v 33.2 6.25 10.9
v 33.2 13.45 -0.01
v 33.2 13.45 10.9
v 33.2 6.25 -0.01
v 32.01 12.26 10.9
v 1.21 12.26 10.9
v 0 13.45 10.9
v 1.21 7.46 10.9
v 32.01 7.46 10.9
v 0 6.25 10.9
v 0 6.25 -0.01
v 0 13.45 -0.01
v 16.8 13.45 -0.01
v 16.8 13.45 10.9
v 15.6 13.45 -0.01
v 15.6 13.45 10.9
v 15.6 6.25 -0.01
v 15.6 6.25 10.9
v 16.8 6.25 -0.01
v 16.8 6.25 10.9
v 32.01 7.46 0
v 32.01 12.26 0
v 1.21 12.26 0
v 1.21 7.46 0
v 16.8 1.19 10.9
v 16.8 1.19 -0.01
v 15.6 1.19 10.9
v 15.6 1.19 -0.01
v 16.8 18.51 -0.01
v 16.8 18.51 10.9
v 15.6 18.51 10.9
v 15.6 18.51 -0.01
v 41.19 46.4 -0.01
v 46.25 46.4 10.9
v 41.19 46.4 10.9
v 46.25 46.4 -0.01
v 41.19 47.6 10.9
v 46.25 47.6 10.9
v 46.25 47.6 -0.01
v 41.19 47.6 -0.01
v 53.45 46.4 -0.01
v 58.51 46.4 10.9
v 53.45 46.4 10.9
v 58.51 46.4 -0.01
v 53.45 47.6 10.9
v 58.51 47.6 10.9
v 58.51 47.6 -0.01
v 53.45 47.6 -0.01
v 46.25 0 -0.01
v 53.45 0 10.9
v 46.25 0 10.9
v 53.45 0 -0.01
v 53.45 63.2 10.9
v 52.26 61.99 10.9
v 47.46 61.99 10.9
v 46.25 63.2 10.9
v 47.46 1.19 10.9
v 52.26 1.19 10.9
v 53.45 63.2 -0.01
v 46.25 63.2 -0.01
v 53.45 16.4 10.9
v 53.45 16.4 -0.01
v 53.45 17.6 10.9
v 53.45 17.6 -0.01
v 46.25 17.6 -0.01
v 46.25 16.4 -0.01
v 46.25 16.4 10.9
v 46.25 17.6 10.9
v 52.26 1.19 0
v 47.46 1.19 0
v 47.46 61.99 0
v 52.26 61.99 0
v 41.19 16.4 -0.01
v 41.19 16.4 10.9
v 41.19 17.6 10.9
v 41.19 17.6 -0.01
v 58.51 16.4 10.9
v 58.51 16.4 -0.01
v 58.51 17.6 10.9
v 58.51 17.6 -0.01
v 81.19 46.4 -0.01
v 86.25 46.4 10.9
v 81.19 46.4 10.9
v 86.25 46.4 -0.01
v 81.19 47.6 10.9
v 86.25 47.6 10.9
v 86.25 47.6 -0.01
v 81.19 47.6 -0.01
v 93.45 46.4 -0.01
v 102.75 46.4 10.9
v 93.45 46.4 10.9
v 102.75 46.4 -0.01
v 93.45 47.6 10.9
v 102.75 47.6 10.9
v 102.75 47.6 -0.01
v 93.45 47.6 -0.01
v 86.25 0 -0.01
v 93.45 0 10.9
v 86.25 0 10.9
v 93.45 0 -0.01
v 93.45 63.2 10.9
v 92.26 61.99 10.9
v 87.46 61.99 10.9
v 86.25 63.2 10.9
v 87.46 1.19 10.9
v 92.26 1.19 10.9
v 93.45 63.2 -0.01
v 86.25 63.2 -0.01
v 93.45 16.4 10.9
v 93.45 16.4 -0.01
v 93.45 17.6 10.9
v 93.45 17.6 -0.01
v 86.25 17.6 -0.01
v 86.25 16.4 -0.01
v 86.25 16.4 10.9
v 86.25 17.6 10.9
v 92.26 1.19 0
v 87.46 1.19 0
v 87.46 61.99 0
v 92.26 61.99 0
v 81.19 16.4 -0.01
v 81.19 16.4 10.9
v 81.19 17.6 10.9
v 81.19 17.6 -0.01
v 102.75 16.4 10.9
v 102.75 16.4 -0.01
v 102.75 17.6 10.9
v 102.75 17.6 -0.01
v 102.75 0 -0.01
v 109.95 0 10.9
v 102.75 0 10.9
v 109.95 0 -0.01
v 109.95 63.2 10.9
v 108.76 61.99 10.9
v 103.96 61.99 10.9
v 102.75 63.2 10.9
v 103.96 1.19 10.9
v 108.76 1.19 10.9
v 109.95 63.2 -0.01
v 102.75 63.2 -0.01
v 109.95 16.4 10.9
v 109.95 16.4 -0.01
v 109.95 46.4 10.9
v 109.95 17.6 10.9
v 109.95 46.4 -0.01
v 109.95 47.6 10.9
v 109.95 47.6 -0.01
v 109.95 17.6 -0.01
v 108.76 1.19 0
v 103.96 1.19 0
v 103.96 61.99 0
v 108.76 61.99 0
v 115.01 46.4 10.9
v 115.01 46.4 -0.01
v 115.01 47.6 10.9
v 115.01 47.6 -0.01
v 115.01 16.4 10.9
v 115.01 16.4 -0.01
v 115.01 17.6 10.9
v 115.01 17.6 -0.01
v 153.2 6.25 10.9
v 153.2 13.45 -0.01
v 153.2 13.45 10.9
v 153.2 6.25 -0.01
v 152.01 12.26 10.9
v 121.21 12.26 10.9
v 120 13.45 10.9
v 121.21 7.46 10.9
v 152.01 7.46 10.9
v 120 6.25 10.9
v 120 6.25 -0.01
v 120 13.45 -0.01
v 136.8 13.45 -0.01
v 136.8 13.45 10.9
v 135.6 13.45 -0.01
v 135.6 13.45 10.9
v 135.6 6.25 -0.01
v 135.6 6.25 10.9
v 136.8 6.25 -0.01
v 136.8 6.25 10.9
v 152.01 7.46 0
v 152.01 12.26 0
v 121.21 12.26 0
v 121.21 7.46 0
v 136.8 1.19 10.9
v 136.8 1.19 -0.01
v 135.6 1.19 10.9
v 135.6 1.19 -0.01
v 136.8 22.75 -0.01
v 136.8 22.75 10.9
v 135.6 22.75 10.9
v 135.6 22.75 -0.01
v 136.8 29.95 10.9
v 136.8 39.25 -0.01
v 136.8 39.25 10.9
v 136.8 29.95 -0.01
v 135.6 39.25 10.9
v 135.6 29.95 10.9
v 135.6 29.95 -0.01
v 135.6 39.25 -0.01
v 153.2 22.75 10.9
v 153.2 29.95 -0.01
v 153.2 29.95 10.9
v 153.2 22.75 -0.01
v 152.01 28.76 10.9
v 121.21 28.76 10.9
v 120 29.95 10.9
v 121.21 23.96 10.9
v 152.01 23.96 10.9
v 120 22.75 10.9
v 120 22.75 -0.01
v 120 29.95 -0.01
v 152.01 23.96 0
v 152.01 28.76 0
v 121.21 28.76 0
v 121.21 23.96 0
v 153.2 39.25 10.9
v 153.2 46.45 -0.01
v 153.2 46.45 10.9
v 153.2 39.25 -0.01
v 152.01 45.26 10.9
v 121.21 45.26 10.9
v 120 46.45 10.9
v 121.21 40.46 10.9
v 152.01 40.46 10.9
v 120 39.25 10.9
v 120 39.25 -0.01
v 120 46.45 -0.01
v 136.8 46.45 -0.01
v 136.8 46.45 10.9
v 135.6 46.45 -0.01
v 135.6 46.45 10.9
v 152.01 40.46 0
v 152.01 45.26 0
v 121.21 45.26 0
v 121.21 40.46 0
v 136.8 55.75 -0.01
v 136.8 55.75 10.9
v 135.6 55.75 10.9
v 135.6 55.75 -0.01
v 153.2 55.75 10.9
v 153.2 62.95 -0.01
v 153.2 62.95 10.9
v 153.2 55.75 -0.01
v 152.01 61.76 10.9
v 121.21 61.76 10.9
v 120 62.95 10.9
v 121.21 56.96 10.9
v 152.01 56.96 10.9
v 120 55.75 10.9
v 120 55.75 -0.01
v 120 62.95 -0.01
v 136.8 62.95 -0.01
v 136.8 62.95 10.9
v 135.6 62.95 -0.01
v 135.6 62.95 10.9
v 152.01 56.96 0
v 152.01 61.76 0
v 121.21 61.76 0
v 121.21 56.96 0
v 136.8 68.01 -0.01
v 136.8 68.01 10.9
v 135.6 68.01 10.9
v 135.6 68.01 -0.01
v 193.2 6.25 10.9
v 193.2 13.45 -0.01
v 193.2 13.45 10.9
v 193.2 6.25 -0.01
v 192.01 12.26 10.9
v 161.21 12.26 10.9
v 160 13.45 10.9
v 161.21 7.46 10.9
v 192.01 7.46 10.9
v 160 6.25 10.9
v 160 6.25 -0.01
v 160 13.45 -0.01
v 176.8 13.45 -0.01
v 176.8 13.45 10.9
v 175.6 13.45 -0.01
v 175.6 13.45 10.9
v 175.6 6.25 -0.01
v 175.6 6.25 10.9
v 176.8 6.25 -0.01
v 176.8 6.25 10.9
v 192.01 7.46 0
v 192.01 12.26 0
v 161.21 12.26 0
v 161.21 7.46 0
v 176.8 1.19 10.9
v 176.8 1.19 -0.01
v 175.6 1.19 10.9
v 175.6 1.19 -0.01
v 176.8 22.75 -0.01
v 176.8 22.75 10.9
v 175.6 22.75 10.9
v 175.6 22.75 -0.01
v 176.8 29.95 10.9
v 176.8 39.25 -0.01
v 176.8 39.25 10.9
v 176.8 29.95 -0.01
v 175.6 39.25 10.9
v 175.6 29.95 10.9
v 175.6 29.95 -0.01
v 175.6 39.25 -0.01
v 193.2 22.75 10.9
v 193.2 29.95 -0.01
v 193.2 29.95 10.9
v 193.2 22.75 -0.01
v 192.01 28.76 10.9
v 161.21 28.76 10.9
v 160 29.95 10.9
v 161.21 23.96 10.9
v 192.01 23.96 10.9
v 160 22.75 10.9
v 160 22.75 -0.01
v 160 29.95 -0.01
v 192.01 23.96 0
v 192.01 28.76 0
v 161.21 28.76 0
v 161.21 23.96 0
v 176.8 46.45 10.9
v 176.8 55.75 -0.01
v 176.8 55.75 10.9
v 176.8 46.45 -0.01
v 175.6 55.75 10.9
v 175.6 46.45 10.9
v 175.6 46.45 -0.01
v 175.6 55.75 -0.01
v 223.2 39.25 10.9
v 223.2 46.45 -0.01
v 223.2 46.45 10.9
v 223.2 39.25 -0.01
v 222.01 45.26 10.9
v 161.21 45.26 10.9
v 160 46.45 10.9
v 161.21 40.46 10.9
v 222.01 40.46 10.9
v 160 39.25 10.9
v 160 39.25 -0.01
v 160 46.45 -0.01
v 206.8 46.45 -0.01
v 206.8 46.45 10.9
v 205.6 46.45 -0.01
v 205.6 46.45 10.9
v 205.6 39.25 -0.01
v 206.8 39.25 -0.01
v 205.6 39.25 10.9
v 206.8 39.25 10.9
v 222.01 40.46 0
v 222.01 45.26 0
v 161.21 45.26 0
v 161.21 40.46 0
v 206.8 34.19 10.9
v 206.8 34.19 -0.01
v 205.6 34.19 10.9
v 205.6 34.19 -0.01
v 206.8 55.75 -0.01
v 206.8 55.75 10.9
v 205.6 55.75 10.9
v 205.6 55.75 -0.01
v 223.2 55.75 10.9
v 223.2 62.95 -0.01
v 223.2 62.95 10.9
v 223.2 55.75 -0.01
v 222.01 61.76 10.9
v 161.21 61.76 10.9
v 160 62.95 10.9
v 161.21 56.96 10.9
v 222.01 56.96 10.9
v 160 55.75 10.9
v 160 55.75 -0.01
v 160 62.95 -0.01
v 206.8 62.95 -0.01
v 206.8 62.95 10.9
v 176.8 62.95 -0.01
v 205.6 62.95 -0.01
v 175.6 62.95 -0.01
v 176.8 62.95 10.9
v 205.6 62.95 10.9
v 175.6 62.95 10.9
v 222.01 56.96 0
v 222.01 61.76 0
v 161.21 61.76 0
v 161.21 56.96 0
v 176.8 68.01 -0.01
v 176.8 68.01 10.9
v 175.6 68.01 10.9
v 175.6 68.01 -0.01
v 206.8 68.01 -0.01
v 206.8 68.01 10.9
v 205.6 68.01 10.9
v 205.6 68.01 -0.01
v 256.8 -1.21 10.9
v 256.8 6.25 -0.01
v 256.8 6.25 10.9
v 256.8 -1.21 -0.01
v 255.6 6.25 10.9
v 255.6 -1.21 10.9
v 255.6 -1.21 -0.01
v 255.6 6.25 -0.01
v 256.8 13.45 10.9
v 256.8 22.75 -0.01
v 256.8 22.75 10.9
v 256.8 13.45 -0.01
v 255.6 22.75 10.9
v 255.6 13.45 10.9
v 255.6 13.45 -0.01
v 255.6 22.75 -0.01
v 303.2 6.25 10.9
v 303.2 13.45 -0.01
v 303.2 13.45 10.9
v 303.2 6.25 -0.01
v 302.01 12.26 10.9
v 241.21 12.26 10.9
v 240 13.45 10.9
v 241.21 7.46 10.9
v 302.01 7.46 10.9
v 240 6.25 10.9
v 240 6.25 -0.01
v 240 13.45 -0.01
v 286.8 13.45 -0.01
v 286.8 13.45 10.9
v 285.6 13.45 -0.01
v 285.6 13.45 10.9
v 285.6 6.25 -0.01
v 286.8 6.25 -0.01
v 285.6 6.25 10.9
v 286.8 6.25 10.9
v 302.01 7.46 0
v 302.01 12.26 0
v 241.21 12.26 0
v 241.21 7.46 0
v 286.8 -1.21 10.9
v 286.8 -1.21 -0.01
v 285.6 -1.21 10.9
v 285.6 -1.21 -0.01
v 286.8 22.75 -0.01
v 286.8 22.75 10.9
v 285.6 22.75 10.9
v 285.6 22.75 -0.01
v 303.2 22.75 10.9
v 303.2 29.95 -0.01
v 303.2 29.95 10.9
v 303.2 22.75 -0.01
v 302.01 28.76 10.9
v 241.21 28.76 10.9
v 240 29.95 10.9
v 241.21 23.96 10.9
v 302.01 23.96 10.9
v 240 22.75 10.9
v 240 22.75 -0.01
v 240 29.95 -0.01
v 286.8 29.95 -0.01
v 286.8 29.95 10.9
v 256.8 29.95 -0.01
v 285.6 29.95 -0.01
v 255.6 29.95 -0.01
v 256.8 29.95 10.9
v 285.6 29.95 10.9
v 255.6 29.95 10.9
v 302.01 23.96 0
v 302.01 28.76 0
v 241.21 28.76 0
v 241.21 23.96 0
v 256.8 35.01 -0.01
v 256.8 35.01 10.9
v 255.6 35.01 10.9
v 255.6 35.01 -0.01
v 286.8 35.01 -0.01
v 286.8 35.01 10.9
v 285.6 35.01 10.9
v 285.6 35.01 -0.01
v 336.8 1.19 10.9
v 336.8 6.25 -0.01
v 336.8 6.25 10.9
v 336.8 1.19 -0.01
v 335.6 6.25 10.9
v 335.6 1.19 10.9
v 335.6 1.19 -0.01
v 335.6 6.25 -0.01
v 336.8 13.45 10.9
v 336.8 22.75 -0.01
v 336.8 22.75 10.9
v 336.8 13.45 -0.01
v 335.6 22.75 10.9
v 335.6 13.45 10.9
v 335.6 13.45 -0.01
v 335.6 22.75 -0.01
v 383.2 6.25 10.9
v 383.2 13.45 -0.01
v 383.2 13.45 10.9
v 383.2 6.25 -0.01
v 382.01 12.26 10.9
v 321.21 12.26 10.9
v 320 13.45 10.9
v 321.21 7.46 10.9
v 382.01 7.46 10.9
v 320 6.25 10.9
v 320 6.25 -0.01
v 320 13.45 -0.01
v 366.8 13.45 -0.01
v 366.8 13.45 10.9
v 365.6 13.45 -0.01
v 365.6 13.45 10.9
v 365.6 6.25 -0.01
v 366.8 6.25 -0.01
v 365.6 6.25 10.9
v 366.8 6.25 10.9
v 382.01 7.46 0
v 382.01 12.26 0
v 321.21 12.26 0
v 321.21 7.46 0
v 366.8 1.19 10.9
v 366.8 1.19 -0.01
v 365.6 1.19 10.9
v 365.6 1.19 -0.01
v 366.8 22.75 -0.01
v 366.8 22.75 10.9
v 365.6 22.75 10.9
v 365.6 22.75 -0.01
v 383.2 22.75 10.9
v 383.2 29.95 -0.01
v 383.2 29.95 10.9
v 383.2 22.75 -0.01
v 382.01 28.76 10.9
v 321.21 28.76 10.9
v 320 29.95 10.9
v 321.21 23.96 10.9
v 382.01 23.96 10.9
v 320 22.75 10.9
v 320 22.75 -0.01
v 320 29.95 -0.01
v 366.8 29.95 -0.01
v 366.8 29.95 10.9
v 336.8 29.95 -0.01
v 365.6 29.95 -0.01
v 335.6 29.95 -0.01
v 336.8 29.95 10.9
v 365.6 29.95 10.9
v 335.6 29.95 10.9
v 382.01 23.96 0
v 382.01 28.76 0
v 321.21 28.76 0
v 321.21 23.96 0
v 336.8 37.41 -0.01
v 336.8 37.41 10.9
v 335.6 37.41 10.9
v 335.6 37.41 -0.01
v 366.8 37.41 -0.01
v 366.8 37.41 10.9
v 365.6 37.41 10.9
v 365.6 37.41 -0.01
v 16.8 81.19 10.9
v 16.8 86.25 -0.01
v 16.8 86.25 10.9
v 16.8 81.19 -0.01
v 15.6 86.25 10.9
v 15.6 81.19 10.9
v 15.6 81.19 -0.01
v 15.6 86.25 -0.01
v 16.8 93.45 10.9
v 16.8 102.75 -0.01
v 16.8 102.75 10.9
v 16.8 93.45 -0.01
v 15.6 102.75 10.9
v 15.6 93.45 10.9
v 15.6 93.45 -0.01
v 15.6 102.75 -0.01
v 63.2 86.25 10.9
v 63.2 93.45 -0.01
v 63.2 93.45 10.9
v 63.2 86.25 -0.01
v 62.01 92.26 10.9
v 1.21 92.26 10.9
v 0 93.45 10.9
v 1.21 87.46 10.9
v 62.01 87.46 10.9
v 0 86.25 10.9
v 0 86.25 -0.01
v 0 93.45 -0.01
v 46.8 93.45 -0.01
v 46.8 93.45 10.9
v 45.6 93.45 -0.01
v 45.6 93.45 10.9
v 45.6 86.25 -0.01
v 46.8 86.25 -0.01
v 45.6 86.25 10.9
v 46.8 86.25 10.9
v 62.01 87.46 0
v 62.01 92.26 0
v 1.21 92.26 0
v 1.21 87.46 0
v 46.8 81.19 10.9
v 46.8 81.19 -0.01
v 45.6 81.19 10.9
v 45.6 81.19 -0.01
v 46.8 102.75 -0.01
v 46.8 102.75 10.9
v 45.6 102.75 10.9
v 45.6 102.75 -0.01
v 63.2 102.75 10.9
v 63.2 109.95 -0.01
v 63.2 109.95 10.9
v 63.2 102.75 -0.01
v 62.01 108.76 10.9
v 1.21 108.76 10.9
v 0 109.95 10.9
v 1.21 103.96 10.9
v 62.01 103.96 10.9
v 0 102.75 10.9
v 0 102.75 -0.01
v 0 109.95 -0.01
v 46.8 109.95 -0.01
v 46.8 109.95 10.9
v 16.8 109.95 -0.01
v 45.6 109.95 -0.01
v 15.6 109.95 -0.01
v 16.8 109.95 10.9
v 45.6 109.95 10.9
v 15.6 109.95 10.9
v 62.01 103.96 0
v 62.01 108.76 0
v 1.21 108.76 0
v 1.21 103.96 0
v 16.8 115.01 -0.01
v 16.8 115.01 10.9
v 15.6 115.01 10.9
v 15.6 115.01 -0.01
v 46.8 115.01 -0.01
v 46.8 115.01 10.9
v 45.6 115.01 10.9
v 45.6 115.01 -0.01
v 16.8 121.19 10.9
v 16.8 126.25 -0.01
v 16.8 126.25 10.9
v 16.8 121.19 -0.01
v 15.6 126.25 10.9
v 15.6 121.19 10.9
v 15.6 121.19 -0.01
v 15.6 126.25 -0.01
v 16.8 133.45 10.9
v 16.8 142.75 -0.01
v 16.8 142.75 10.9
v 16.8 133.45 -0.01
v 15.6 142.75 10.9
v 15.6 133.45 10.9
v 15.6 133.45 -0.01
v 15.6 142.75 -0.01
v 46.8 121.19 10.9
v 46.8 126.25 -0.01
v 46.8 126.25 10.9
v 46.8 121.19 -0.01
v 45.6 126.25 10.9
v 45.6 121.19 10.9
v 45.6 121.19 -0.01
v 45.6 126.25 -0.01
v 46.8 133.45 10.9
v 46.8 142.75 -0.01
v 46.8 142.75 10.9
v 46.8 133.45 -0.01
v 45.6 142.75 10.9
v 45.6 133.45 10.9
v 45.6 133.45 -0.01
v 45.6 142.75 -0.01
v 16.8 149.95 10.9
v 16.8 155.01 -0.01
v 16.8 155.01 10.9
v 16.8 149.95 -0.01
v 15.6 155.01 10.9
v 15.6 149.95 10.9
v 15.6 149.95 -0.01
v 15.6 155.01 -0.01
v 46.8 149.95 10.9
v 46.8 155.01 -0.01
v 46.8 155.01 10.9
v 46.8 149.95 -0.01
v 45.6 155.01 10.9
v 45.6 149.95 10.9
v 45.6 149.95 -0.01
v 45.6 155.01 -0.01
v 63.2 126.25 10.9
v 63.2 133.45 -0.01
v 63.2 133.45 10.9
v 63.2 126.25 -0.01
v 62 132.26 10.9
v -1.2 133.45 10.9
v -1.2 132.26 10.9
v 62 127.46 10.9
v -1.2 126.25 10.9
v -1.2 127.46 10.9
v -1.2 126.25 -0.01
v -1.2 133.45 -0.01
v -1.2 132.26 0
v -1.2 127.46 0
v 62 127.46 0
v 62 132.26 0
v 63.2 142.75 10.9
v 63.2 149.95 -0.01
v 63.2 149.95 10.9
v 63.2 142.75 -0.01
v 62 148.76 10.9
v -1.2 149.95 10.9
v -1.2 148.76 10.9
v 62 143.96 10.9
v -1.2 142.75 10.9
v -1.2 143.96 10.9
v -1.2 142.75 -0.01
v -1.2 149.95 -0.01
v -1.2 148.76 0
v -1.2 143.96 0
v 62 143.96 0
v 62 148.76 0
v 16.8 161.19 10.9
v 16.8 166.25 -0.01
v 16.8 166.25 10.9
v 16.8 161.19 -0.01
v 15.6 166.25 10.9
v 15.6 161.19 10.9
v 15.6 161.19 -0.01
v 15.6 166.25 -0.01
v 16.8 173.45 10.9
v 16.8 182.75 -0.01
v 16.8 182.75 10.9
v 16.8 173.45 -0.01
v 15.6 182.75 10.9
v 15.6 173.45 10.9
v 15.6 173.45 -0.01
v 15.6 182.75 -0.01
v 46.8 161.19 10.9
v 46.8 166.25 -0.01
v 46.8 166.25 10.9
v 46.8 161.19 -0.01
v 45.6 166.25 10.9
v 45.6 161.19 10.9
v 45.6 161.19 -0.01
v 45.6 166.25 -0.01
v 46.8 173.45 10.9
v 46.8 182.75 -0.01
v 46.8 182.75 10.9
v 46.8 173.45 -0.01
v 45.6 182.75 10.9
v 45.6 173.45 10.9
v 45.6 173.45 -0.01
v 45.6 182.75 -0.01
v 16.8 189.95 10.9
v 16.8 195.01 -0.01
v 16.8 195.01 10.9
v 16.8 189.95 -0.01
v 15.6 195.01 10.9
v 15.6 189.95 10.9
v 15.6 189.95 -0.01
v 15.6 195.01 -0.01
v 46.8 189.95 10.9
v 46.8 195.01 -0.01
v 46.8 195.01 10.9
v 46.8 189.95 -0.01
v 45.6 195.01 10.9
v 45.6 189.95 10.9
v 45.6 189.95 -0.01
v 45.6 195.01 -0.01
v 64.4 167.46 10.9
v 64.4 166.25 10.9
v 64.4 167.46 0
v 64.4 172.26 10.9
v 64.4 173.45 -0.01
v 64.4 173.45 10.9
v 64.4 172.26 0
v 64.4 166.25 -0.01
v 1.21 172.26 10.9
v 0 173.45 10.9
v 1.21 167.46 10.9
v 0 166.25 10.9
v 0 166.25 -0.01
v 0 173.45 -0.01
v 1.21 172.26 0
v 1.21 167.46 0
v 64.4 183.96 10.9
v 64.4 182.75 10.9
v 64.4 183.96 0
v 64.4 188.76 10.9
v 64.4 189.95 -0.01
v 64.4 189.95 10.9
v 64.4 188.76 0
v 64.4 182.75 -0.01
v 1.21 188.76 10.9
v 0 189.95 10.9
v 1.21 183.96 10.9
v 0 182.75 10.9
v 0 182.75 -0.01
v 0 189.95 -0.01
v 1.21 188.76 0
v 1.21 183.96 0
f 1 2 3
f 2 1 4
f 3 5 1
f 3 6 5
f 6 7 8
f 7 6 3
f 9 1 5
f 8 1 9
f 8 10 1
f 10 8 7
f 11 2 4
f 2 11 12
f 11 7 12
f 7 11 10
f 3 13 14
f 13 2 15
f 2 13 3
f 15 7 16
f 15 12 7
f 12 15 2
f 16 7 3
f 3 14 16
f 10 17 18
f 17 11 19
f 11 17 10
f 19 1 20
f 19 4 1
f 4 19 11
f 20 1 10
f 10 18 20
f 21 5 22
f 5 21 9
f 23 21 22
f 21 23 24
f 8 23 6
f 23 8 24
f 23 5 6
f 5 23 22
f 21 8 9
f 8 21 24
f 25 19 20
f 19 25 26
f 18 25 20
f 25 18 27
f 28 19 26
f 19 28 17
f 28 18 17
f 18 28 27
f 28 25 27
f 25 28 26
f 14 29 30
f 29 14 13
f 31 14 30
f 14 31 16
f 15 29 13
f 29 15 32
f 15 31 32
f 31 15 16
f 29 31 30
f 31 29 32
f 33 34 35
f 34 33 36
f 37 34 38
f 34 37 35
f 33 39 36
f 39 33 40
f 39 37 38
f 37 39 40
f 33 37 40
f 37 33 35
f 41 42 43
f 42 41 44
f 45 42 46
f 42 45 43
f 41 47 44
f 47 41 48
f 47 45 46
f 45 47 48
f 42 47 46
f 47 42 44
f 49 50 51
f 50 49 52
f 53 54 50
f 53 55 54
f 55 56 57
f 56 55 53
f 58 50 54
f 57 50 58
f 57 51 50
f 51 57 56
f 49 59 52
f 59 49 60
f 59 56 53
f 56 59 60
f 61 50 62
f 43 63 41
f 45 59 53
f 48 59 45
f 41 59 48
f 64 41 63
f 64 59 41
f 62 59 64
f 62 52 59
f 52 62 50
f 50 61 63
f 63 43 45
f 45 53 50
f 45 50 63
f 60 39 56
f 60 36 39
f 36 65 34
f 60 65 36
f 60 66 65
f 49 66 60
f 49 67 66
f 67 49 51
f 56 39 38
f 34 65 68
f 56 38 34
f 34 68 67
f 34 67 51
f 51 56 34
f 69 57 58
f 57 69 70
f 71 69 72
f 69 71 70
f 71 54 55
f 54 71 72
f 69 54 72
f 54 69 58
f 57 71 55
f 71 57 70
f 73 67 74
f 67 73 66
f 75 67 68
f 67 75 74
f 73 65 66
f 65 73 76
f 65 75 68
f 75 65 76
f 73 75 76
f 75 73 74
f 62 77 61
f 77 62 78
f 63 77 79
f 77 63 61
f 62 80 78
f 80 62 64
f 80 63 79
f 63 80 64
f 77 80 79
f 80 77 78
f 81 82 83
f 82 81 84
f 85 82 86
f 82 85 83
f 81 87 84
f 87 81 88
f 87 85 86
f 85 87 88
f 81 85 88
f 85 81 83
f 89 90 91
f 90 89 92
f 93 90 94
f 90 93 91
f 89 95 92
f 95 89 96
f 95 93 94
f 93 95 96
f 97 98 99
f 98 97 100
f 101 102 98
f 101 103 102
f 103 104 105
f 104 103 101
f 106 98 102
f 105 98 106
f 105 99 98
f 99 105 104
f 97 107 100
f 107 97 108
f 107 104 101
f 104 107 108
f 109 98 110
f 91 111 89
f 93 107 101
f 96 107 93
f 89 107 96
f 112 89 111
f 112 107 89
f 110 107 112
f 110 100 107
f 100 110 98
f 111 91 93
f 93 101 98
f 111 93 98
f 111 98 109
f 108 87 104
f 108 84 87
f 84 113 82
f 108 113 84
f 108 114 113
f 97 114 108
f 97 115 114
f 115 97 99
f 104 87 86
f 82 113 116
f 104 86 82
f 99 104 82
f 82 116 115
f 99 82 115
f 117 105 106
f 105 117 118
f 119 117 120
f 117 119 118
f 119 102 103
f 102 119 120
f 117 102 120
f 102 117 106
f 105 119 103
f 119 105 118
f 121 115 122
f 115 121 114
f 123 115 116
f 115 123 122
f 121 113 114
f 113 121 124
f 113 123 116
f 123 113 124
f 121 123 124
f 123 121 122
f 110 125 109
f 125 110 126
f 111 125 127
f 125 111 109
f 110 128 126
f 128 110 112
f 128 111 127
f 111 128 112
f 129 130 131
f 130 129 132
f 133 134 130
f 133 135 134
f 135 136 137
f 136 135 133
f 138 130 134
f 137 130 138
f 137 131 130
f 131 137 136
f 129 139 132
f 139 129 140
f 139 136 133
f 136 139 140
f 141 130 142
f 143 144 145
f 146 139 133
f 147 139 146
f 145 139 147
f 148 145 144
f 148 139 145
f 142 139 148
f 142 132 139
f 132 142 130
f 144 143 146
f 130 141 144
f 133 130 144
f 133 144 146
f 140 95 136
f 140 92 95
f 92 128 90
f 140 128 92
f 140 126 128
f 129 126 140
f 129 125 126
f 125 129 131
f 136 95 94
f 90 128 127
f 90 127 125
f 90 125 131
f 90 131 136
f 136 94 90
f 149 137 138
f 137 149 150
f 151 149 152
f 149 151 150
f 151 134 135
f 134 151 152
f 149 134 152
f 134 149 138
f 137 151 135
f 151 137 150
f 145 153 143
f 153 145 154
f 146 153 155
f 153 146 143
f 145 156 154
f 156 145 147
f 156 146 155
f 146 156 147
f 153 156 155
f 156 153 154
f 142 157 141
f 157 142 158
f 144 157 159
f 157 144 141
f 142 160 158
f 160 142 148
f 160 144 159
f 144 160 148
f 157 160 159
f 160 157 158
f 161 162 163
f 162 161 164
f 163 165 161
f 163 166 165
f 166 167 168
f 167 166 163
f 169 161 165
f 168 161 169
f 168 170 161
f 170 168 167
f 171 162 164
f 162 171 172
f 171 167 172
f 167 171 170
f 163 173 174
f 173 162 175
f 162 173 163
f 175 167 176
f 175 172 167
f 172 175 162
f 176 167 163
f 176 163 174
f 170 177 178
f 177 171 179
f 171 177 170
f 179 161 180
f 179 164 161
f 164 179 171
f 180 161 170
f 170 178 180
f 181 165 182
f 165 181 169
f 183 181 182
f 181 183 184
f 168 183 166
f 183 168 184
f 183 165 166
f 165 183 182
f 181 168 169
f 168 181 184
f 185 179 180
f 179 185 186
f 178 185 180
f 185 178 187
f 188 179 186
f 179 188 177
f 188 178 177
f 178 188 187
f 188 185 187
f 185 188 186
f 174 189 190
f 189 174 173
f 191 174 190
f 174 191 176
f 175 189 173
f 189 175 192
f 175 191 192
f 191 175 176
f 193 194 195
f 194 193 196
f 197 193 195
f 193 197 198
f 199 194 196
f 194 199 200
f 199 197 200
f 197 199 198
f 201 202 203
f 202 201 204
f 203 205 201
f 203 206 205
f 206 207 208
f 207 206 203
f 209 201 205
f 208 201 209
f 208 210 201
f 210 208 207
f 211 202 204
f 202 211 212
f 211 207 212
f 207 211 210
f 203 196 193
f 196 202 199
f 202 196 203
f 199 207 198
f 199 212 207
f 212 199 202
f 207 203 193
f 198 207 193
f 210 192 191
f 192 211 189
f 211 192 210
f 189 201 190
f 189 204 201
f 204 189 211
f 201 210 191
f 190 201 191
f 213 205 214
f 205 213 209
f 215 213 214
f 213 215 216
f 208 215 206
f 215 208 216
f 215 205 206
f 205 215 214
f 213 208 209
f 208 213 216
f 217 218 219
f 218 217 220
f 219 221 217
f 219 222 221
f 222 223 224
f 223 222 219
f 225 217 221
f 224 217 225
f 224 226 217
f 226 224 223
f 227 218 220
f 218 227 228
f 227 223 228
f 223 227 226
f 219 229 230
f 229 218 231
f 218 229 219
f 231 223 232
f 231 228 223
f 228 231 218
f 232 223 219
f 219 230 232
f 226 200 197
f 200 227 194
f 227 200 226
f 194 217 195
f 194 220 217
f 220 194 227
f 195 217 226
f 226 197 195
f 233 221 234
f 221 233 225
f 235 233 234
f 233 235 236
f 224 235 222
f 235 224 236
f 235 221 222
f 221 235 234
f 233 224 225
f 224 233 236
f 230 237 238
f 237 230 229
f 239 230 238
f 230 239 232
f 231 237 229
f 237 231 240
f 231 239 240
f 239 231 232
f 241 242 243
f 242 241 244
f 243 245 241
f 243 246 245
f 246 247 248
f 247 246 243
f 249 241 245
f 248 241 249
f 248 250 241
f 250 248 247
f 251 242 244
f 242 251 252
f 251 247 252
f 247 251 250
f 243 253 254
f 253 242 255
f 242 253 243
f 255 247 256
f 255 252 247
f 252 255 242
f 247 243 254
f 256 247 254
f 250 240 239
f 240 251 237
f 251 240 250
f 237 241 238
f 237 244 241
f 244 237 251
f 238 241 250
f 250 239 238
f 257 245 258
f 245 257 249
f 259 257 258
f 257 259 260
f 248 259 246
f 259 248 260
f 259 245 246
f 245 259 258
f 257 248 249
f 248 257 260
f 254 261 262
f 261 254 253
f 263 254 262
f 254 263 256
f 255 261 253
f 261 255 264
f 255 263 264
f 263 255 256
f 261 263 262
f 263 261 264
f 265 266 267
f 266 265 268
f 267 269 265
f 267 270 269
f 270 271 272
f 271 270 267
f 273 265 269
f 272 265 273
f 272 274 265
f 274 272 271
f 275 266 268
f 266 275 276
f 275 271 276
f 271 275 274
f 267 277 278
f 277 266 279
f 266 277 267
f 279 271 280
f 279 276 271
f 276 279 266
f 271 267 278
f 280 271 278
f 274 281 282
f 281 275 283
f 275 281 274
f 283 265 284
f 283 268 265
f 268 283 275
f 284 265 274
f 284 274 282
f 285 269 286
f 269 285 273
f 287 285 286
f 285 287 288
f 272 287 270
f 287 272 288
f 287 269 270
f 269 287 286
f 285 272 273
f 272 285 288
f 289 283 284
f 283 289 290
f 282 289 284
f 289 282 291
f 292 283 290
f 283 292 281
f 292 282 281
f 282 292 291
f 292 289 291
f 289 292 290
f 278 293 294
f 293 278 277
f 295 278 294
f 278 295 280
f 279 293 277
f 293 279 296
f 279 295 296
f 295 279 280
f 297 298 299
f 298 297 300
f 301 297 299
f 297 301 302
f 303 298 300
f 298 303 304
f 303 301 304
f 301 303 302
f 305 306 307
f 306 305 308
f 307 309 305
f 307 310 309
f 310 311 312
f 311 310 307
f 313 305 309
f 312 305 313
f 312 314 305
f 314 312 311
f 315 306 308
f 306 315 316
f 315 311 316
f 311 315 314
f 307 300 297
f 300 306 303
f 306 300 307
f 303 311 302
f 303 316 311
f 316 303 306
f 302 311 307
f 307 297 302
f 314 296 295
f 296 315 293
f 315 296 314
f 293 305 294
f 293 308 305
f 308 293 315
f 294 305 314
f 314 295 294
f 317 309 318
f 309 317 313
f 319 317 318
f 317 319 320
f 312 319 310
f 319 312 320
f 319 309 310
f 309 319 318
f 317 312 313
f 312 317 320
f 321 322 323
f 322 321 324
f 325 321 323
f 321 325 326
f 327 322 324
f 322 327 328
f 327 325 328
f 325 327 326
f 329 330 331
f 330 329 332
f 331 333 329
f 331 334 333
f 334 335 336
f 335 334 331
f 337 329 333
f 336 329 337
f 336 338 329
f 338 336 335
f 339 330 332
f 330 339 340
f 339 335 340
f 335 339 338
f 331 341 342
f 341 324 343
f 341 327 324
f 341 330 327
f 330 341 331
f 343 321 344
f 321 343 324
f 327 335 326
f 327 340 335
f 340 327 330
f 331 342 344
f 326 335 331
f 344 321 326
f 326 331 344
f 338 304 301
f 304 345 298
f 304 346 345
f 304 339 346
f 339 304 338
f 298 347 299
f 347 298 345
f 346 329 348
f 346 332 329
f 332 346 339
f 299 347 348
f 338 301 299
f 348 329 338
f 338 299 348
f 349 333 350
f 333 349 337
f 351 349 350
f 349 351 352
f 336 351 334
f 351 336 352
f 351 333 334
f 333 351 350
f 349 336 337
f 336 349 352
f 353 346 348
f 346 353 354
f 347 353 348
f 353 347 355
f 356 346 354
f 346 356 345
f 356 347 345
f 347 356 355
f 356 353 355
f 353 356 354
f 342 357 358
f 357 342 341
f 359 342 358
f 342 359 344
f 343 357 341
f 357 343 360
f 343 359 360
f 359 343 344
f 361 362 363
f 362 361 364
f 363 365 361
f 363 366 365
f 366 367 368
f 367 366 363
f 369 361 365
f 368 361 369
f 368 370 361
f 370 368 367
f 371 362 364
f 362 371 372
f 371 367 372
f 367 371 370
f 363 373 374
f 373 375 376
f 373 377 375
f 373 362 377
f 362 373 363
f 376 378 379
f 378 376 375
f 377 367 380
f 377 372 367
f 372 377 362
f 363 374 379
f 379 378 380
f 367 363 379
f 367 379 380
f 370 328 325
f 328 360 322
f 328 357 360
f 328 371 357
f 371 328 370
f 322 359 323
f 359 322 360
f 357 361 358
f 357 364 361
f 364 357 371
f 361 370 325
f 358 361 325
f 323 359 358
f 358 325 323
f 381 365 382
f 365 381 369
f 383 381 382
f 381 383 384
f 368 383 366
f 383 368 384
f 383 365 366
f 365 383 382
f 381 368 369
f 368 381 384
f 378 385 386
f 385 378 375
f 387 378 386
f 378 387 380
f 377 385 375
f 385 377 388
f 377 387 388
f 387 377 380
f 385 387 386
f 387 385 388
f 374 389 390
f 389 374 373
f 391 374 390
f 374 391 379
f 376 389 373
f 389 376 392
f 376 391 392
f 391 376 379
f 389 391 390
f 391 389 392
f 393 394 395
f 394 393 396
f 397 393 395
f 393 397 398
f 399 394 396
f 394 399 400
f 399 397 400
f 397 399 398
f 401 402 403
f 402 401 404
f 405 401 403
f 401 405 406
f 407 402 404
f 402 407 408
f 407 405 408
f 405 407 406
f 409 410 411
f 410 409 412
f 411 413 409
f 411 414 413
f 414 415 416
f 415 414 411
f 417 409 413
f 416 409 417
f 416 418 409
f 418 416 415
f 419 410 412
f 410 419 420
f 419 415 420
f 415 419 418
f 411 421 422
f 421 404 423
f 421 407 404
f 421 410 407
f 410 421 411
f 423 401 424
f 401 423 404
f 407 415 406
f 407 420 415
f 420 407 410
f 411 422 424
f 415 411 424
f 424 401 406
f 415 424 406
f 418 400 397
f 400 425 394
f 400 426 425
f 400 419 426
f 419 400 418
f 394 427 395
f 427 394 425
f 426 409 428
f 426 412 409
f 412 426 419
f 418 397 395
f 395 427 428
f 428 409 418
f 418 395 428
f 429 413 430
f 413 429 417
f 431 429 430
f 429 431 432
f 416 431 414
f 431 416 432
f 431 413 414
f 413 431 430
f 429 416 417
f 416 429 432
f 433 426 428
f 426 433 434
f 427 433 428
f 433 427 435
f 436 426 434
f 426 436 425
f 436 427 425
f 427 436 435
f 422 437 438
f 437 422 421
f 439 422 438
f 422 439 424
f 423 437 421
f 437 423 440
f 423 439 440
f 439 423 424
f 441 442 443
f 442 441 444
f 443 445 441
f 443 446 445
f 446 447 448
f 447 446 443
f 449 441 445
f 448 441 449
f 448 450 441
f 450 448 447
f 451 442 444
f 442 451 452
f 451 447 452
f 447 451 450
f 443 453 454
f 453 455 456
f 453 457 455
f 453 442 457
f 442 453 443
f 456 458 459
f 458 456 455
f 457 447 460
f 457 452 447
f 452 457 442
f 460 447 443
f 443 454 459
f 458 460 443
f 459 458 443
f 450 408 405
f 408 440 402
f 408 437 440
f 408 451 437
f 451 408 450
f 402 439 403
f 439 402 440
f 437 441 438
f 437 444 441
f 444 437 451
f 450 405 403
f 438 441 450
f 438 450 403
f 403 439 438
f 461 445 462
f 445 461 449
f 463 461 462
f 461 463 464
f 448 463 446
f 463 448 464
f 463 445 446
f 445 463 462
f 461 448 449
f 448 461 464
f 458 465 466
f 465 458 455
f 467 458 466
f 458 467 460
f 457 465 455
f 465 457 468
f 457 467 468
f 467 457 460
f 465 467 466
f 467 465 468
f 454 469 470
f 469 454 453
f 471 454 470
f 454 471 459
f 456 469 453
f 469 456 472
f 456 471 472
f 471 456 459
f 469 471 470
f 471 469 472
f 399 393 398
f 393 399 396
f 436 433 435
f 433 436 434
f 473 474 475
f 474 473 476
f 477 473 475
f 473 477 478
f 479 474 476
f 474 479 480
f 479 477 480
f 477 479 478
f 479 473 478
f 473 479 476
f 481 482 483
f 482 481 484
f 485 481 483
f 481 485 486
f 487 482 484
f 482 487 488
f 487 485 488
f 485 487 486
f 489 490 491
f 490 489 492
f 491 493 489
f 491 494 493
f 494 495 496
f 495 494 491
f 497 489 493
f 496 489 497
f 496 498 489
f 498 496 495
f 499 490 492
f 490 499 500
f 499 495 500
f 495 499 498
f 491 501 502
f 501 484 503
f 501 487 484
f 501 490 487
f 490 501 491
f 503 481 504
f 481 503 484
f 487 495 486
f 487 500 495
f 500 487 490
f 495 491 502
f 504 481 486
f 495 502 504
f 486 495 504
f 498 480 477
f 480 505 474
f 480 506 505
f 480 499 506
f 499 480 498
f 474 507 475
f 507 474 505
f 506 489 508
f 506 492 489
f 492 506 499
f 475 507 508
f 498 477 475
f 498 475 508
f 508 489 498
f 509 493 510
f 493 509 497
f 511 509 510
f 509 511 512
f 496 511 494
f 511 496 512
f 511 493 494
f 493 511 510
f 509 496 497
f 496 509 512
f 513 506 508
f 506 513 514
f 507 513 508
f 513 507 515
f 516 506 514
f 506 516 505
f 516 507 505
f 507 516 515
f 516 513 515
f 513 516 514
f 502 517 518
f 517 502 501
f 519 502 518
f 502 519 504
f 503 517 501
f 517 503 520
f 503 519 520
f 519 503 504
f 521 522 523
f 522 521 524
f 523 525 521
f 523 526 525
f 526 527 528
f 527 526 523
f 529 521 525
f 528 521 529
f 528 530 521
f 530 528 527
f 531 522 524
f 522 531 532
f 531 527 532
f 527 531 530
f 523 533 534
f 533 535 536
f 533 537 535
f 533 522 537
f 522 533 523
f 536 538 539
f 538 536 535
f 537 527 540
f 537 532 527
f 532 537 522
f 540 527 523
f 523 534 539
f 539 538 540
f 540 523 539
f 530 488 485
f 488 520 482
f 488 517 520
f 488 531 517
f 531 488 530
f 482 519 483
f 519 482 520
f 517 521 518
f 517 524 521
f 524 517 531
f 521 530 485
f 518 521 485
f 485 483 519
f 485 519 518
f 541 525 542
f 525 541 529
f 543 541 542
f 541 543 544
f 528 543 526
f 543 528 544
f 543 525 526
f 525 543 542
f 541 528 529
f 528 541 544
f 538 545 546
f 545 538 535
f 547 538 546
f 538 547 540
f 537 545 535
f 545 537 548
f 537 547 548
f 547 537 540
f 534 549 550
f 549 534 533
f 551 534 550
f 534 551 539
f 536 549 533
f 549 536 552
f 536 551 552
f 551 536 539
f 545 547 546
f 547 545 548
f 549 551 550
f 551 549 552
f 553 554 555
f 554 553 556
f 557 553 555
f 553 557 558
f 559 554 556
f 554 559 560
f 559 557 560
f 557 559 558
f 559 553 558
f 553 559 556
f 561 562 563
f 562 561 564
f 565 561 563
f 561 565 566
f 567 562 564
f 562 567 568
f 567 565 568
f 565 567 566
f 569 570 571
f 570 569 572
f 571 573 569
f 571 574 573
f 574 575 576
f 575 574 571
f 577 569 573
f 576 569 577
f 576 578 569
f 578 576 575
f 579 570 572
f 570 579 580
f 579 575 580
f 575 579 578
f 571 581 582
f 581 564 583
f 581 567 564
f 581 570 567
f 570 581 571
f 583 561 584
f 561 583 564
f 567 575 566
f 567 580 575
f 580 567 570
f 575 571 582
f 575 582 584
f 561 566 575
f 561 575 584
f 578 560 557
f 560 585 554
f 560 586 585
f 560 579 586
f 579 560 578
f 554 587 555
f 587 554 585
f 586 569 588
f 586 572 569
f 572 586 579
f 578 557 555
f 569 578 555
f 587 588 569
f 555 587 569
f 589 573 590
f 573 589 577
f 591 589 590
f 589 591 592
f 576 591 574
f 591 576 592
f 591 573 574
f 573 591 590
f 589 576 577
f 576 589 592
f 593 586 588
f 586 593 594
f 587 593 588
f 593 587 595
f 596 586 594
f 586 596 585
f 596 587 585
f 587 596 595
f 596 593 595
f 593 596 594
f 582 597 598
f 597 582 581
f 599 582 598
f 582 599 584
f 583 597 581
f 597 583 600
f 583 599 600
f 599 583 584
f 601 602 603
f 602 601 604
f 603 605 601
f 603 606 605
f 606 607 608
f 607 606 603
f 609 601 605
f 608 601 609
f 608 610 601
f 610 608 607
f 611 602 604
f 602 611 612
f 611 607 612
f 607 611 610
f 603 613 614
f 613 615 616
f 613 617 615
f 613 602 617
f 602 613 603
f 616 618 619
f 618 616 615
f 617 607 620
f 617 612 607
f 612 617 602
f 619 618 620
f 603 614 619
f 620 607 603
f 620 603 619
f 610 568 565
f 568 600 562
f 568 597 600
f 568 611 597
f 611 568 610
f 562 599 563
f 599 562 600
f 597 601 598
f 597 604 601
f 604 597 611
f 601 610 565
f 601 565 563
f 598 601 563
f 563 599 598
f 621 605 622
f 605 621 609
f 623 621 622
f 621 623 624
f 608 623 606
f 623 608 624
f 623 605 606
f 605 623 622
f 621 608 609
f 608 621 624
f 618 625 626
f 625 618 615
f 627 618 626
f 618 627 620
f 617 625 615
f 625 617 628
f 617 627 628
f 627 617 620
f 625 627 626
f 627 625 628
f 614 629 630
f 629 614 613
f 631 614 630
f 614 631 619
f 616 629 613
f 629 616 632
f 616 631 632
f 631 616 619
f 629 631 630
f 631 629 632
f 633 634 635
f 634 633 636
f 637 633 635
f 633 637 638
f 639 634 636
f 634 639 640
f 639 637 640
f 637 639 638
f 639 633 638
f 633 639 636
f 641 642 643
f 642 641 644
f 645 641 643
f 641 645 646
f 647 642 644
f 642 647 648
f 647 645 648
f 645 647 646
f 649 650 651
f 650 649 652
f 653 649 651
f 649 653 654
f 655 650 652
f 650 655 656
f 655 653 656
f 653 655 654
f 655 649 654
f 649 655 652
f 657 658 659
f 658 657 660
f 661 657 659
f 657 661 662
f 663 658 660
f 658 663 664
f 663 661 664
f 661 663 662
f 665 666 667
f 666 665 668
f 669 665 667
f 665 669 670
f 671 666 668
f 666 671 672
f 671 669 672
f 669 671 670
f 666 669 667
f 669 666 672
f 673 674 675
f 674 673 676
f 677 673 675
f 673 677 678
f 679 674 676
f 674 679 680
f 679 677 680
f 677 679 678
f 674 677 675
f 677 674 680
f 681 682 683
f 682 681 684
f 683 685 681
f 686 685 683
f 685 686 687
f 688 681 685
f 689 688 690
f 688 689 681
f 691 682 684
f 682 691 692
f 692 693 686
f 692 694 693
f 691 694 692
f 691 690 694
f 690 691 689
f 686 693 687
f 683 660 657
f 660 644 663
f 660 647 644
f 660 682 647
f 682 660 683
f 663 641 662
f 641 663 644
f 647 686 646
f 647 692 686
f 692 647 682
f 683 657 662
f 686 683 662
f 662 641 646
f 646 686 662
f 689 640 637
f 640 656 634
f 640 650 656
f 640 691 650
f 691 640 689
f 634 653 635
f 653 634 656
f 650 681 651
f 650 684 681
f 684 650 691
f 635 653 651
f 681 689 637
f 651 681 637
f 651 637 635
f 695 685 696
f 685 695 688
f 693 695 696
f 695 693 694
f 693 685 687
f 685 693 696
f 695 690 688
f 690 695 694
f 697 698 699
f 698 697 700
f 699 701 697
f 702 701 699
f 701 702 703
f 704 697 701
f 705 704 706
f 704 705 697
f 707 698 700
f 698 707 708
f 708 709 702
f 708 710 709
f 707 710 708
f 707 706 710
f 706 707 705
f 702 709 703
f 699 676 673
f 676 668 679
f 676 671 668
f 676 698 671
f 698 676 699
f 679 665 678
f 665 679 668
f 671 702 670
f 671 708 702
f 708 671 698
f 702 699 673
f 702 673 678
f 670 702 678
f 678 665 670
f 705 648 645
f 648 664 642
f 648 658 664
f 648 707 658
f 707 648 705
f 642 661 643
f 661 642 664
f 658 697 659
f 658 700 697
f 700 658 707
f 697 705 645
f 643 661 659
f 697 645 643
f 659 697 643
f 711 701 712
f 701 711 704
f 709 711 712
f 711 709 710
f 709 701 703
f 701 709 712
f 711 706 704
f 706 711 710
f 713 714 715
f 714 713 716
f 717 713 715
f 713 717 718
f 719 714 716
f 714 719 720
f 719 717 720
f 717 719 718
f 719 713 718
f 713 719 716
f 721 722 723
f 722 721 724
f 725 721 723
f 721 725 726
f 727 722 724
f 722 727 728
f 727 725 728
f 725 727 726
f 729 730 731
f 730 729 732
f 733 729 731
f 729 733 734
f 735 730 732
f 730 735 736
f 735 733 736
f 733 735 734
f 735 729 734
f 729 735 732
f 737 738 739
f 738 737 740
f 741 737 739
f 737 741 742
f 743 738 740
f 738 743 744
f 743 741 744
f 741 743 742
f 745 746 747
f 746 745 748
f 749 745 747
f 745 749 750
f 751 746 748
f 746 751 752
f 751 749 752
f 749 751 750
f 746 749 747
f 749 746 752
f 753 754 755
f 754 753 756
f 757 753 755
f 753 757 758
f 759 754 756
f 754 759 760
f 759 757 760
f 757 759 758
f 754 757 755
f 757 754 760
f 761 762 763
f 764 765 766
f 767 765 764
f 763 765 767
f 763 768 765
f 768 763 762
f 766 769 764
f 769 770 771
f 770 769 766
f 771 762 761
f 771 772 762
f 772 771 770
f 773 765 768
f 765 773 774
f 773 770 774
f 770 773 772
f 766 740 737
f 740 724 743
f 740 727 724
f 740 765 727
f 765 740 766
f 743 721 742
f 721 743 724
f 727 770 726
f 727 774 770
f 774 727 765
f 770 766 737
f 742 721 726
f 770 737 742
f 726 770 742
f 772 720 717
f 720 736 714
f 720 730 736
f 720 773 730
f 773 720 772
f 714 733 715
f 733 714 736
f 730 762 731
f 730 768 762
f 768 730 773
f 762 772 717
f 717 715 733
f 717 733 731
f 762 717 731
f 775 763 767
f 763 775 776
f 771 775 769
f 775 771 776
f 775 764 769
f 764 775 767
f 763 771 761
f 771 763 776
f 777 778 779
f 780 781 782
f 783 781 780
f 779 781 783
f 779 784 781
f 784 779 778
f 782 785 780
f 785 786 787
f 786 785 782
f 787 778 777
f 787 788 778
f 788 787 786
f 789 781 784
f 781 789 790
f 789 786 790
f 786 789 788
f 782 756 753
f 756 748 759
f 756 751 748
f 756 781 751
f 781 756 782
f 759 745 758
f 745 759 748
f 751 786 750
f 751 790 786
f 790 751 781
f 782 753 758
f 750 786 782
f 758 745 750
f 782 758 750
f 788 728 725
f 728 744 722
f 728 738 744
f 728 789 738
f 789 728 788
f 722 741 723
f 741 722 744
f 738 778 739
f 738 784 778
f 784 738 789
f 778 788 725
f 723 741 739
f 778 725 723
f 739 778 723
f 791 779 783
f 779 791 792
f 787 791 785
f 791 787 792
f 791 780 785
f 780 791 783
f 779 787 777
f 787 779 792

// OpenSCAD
// file: ../../Base/Boxes.scad
// Fischertechnik Box Foundation
// Pre-designed Boxes

use <Constants.scad>

include <PlacementOptions.scad>

box190Width = 190;
box190Depth = 130;
box130Width = 130;
box130Depth = 95;
boxUsageHeight = 33.9;
boxWallThickness = 2.4;
boxBaseThickness = 1.0;
boxWebWidth = 3.0;

// getBoxWallThickness()
// Gets the wall thickness of a Fischertechnik Box

function getBoxWallThickness() = boxWallThickness;

// Gets the usable height of a fischertechnik box
function getBoxUsageHeight() = boxUsageHeight;

// Gets the thickness of the Fischertechnik box base.
function getBoxBaseThickness() = boxBaseThickness;

// Gets the width of a box web
function getBoxWebWidth() = boxWebWidth;

// Gets the usable inner space of a Box 190 as an x/y-list
function getBox190Space() = [
    box190Width - 2*getBoxWallThickness(), 
    box190Depth - 2*getBoxWallThickness() ];

// Imports the Fischertechnik empty box 130x190 mm and places it at position 0,0
// 190x130 are the outer sizes, the inner space is slightly smaller. Use getBox190Space() to get the inner sizes.
// This module needs the STL file "Fischertechnik Box 130x190.stl" in the library path.
// The box is positioned that the usable inner space is at the 0,0,0 position. The

module Box190() {
    translate([-getBoxWallThickness(),-getBoxWallThickness(),-getBoxBaseThickness()])
        import("Fischertechnik Box 130x190.stl", convexity=3);
}

// Gets the usable inner space of a Box 130 as an x/y-list
function getBox130Space() = [
    box130Width - 2*getBoxWallThickness(), 
    box130Depth - 2*getBoxWallThickness() ];

// Imports the Fischertechnik empty box 95x130 mm and places it at position 0,0
// 190x130 are the outer sizes, the inner space is slightly smaller. Use getBox190Space() to get the inner sizes.
// This module needs the STL file "Fischertechnik Box 95x130.stl" in the library path.
// The box is positioned that the usable inner space is at the 0,0,0 position. The

module Box130() {
    translate([-getBoxWallThickness(),-getBoxWallThickness(),-getBoxBaseThickness()])
        import("Fischertechnik Box 95x130.stl", convexity=3);
}

// Creates a web at the specified box walls
// corner 0 = LowerLeft, 1 = UpperLeft, 2 = UpperRight, 3 = LowerRight
// side 0 = LeftOfCorner, 1 = RightOfCorner
// distance = Distance in mm from the corner
// boxSpace = inner width and depth of the box (default: Box 190)
// webWidth = length of the web (default is 3 mms)
// webThickness = thickness of the web (default is 1 mm)

module BoxWeb(corner, side, distance, boxSpace=getBox190Space(), webWidth=getBoxWebWidth(), webThickness=1.0) {
    sink = getBoxWallThickness()/2;

    width = (corner % 2 == 0) ? 
            (side == LeftOfCorner ? webWidth : webThickness) :
            (side == LeftOfCorner ? webThickness : webWidth);

    depth = (corner % 2 == 0) ? 
            (side == RightOfCorner ? webWidth : webThickness) :
            (side == RightOfCorner ? webThickness : webWidth);
    
    xDiff = corner == LowerLeft ? 
                (side == LeftOfCorner ? -sink : distance) :
            (corner == UpperLeft ?                
                (side == LeftOfCorner ? distance : -sink) :
            (corner == UpperRight ?
                (side == LeftOfCorner ? boxSpace.x-webWidth+sink : boxSpace.x-distance-webThickness) :
                (side == LeftOfCorner ? boxSpace.x-distance-webThickness: boxSpace.x-webWidth+sink)));

    yDiff = corner == LowerLeft ? 
                (side == RightOfCorner ? -sink : distance) :
            (corner == UpperLeft ?
                (side == RightOfCorner ? boxSpace.y-distance : boxSpace.y-webWidth+sink) :
            (corner == UpperRight ?
                (side == RightOfCorner ? boxSpace.y-webWidth+sink : boxSpace.y-distance) :
                (side == RightOfCorner ? distance : -sink)));
    
    translate([xDiff, yDiff, -getExcess()])
        cube([width, depth, boxUsageHeight + 2*getExcess()]);
}
// file: ../../Base/Rotation.scad
// Fischertechnik Box Foundation
// Geometry Helpers Rotation

include <PlacementOptions.scad>

// getRotatedSpace(space, rotation=NoRotation)
// Rotates the space dependent on the specified rotation

function getRotatedSpace(space, rotation=NoRotation) = [
    (rotation == Rotate90 || rotation == Rotate270) ? space.y : space.x,
    (rotation == Rotate90 || rotation == Rotate270) ? space.x : space.y
];

// Rotates the given space around the fixed left lower corner
// space = the space the children needs as width/depth list [width,depth]
// rotation = 0 Rotate0 degrees, 1 Rotate90 degrees, 2 Rotate180 degrees, 3 Rotate270 degrees (equivalent to -90)

module RotateFix(space, rotation=Rotate0) {
    dy = (rotation == Rotate0 || rotation == Rotate270) ? 0 :
        (rotation == Rotate90) ? space.x :
        space.y;
    dx = (rotation < Rotate180) ? 0 :
        (rotation == Rotate180) ? space.x :
        space.y;
    
    translate([dx, dy, 0])
        rotate([0, 0, rotations[rotation]])
            children();
}
// file: ../../Base/Alignment.scad
// Fischertechnik Box Foundation
// Geometry Helpers Alignment

include <PlacementOptions.scad>

// getAlignedX(elementWidth, spaceWidth, align=AlignRight, offset=0)
// Gets the aligned X offset of an element with the given
// width in the given space.
// elementWidth = The width of the element to positon
// spaceWidth = The space where the element should be aligned
// align = 0 AlignLeft, 1 AlignCenter, 2 AlignRight
// offset = an optional offset from the aligned position. When
// aligned left or centered, then positive values are in X direction.
// When aligned right then positive values are in negative X direction.

function getAlignedX(elementWidth, spaceWidth, align=AlignRight, offset=0) =
    (align == AlignLeft) ?
        offset :
        ((align == AlignCenter) ?
        (spaceWidth - elementWidth)/2 + offset :
        spaceWidth - offset - elementWidth);

// getAlignedY(elementDepth, spaceDepth, align=AlignTop, offset=0)
// Gets the aligned Y offset of an element with the given
// depth in the given space.
// elementDepth = The depth of the element to positon
// spaceDepth = The space where the element should be aligned
// align = 0 AlignBottom, 1 AlignCenter, 2 AlignTop
// offset = an optional offset from the aligned position. When
// aligned bottom or centered, then positive values are in Y direction.
// When aligned top then positive values are in negative Y direction.

function getAlignedY(elementDepth, spaceDepth, align=AlignTop, offset=0) =
    (align == AlignBottom) ?
        offset :
        ((align == AlignCenter) ?
        (spaceDepth - elementDepth)/2 + offset :
        spaceDepth - offset - elementDepth);
// file: ../../Base/PlacementOptions.scad
// Fischertechnik Box Foundation
// Placement Options

// Alignment
NoAlign = 0;
AlignLeft = 1;
AlignBottom = 2;
AlignCenter = 3;
AlignRight = 4;
AlignTop = 5;

// Element rotation degree steps
rotations = [0, -90, -180, -270];

// Rotation
NoRotation = 0;
Rotate0 = 0;
Rotate90 = 1;
Rotate180 = 2;
Rotate270 = 3;

// Docking (seen from above)
NoDock = -1;
DockLeft = 0;
DockTop = 1;
DockRight = 2;
DockCorner = 2;
DockBottom = 3;

// Web corners
LowerLeft = 0;
UpperLeft = 1;
UpperRight = 2;
LowerRight = 3;

// Web position relative to corner
LeftOfCorner = 0;
RightOfCorner = 1;
// file: ../../Base/Constants.scad
// Fischertechnik Box Foundation
// Constants

// Constant values necessary for multiple elements

// Base constants
dividerThickness = 1.2;
excess = 0.01;
fragments = 90;
tolerance = 0.8;

// Gets the thickness of a divider 
function getDividerThickness() = dividerThickness;

// Gets the excess that is used to merge walls into each other
function getExcess() = excess;

// Gets amount of fragments of a cylinder
function getFragments() = fragments;

// Gets the inner tolerance of a frame to each side
function getTolerance() = tolerance;


// Fischertechnik specific constants
axisDiameter = 4;
axisBottomDiameter = axisDiameter + 1;
standardEdgeDistance = 2.5;
standardWebDistance = 11.5;
standardCornerLength = 15;
tubeWallFactor = 0.8;
smallPartsFrameHeight = 20;

// Gets axis diameter
function getAxisDiameter() = axisDiameter;

// Gets axis bottom diameter for thicker part at the bottom
function getAxisBottomDiameter() = axisBottomDiameter;

// gets the standard distance to the wall of the box for dockable frames with webs
function getStandardEdgeDistance() = standardEdgeDistance;

// gets the standard distance of each web to the corner of the dockable frame
function getStandardWebDistance() = standardWebDistance;

// gets the standard length of the corner walls of a dockable frame
function getStandardCornerLength() = standardCornerLength;

// gets the wall thickness of a tube.
function getTubeWallThickness() = tubeWallFactor * getDividerThickness();

// gets the frame height for docked small parts boxes.
function getSmallPartsFrameHeight() = smallPartsFrameHeight;
// file: ../../Base/Placement.scad
// Fischertechnik Box Foundation
// Geometry Helpers Placement

use <Constants.scad>
use <Alignment.scad>
use <Rotation.scad>
use <Boxes.scad>

include <PlacementOptions.scad>

// Place(x=0, y=0, elementSpace=[0,0], alignX=AlignLeft, alignY=AlignBottom, rotation=Rotate0, boxSpace=getBox190Space())
// Places the child at the specified position
// y = Y-Position. This is a relative position when an X aligment is specified.
// x = X-Position. This is a relative position when an Y aligment is specified.
// elementSpace = space of the element to be placed [x,y]
// alignX = -1=NoAlign, 0 AlignLeft, 1 AlignCenter, 3 AlignRight (elementSpace and boxSpace required!)
// alignY = -1=NoAlign, 2 AlignBottom, 1 AlignCenter, 4 AlignTop (elementSpace and boxSpace required!)
// rotation = 0 Rotate0 0 degrees, 1 Rotate90 90 degrees, 
// 2 Rotate180 180 degrees, 3 Rotate270 270 degrees (equivalent to -90)
// boxSpace = Inner space of the box where the placement occurs [x,y] - default is Box 190x130 inner space

module Place(x=0, y=0, elementSpace=[0,0], 
  alignX=AlignLeft, alignY=AlignBottom, 
  rotation=NoRotation, boxSpace=getBox190Space()) {

    module Position(x, y, space, rotation=Rotate0) {
        translate([x, y, 0])
            RotateFix(space, rotation)
                children();
    }

    space = getRotatedSpace(elementSpace, rotation);
    alignedX = getAlignedX(space.x, boxSpace.x, alignX, x);
    alignedY = getAlignedY(space.y, boxSpace.y, alignY, y);
    Position(alignedX, alignedY, elementSpace, rotation)
        children();
}

// Center(space=getBox130Space(), elementSpace=[0,0])
// space = Space where the children is centered. For cylinder use centered=true and no elementSpace.
// elementSpace = space of the element to be centered [x,y]

module Center(space=getBox190Space(), elementSpace=[0,0]) {
    Place(elementSpace=elementSpace, boxSpace=space, alignX=AlignCenter, alignY=AlignCenter)
        children();
}

// CenterHorizontal(width=0, y=0, offset=0, space=getBox130Space())
// width = Width of the element to be placed.
// y = Y position of the element
// offset = Offset from the center position (negative will be left of the center)
// space = Space where the element is placed

module CenterHorizontal(width=0, y=0, offset=0, space=getBox190Space()) {
    Place(x=offset, y=y, elementSpace=[width, 0], boxSpace=space, alignX=AlignCenter)
        children(0);
}

// CenterVertical(depth=0, x=0, offset=0, space=getBox130Space())
// depth = Depth of the element to be placed.
// x = X position of the element
// offset = Offset from the center position (negative will be down of the center)
// space = Space where the element is placed

module CenterVertical(depth=0, x=0, offset=0, space=getBox190Space()) {
    Place(x=x, y=offset, elementSpace=[0, depth], boxSpace=space, alignY=AlignCenter)
        children(0);
}

// getIsVertical(align)
// True if the specified alignment needs a vertical orientation for a divider (AlignRight, AlignLeft)

function getIsVertical(align) = (align == AlignRight || align == AlignLeft);

// getIsHorizontal(align)
// True if the specified alignment needs a horizontal orientation for a divider (AlignTop, AlignBottom)

function getIsHorizontal(align) = (align == AlignTop || align == AlignBottom);
// main file
// Fischertechnik Box Foundation
// ModelBase Complex
// Test RackBase

use <../../Base/Placement.scad>
use <../../Base/Constants.scad>
use <../../ModelBase/Complex.scad>

include <../../Base/PlacementOptions.scad>

RackBase();

Place(40, 0, getFrameRackSpace(2), rotation=Rotate90)
    RackBase(2);

Place(80, 0, getFrameRackSpace(2, 2), rotation=Rotate90)
    RackBase(2, 2);

Place(120, 0)
    RackBase(1, 4);

Place(160, 0) {
    RackBase(1, 2);    
    Place(0, getFrameRackSpace(1, 2).y - 2*getDividerThickness() - getTolerance())
        RackBase(2, 2);
}

Place(240, 0) {
    RackBase(2, 2, alignY=AlignBottom);    
}

Place(320, 0) {
    RackBase(2, 2, alignY=AlignTop);    
}

Place(0, 80) {
    RackBase(2, 2, alignX=NoAlign);    
}

Place(0, 120) {
    RackBase(2, 2, alignX=AlignLeft);
}

Place(0, 160) {
    RackBase(2, 2, alignX=AlignRight);
}
